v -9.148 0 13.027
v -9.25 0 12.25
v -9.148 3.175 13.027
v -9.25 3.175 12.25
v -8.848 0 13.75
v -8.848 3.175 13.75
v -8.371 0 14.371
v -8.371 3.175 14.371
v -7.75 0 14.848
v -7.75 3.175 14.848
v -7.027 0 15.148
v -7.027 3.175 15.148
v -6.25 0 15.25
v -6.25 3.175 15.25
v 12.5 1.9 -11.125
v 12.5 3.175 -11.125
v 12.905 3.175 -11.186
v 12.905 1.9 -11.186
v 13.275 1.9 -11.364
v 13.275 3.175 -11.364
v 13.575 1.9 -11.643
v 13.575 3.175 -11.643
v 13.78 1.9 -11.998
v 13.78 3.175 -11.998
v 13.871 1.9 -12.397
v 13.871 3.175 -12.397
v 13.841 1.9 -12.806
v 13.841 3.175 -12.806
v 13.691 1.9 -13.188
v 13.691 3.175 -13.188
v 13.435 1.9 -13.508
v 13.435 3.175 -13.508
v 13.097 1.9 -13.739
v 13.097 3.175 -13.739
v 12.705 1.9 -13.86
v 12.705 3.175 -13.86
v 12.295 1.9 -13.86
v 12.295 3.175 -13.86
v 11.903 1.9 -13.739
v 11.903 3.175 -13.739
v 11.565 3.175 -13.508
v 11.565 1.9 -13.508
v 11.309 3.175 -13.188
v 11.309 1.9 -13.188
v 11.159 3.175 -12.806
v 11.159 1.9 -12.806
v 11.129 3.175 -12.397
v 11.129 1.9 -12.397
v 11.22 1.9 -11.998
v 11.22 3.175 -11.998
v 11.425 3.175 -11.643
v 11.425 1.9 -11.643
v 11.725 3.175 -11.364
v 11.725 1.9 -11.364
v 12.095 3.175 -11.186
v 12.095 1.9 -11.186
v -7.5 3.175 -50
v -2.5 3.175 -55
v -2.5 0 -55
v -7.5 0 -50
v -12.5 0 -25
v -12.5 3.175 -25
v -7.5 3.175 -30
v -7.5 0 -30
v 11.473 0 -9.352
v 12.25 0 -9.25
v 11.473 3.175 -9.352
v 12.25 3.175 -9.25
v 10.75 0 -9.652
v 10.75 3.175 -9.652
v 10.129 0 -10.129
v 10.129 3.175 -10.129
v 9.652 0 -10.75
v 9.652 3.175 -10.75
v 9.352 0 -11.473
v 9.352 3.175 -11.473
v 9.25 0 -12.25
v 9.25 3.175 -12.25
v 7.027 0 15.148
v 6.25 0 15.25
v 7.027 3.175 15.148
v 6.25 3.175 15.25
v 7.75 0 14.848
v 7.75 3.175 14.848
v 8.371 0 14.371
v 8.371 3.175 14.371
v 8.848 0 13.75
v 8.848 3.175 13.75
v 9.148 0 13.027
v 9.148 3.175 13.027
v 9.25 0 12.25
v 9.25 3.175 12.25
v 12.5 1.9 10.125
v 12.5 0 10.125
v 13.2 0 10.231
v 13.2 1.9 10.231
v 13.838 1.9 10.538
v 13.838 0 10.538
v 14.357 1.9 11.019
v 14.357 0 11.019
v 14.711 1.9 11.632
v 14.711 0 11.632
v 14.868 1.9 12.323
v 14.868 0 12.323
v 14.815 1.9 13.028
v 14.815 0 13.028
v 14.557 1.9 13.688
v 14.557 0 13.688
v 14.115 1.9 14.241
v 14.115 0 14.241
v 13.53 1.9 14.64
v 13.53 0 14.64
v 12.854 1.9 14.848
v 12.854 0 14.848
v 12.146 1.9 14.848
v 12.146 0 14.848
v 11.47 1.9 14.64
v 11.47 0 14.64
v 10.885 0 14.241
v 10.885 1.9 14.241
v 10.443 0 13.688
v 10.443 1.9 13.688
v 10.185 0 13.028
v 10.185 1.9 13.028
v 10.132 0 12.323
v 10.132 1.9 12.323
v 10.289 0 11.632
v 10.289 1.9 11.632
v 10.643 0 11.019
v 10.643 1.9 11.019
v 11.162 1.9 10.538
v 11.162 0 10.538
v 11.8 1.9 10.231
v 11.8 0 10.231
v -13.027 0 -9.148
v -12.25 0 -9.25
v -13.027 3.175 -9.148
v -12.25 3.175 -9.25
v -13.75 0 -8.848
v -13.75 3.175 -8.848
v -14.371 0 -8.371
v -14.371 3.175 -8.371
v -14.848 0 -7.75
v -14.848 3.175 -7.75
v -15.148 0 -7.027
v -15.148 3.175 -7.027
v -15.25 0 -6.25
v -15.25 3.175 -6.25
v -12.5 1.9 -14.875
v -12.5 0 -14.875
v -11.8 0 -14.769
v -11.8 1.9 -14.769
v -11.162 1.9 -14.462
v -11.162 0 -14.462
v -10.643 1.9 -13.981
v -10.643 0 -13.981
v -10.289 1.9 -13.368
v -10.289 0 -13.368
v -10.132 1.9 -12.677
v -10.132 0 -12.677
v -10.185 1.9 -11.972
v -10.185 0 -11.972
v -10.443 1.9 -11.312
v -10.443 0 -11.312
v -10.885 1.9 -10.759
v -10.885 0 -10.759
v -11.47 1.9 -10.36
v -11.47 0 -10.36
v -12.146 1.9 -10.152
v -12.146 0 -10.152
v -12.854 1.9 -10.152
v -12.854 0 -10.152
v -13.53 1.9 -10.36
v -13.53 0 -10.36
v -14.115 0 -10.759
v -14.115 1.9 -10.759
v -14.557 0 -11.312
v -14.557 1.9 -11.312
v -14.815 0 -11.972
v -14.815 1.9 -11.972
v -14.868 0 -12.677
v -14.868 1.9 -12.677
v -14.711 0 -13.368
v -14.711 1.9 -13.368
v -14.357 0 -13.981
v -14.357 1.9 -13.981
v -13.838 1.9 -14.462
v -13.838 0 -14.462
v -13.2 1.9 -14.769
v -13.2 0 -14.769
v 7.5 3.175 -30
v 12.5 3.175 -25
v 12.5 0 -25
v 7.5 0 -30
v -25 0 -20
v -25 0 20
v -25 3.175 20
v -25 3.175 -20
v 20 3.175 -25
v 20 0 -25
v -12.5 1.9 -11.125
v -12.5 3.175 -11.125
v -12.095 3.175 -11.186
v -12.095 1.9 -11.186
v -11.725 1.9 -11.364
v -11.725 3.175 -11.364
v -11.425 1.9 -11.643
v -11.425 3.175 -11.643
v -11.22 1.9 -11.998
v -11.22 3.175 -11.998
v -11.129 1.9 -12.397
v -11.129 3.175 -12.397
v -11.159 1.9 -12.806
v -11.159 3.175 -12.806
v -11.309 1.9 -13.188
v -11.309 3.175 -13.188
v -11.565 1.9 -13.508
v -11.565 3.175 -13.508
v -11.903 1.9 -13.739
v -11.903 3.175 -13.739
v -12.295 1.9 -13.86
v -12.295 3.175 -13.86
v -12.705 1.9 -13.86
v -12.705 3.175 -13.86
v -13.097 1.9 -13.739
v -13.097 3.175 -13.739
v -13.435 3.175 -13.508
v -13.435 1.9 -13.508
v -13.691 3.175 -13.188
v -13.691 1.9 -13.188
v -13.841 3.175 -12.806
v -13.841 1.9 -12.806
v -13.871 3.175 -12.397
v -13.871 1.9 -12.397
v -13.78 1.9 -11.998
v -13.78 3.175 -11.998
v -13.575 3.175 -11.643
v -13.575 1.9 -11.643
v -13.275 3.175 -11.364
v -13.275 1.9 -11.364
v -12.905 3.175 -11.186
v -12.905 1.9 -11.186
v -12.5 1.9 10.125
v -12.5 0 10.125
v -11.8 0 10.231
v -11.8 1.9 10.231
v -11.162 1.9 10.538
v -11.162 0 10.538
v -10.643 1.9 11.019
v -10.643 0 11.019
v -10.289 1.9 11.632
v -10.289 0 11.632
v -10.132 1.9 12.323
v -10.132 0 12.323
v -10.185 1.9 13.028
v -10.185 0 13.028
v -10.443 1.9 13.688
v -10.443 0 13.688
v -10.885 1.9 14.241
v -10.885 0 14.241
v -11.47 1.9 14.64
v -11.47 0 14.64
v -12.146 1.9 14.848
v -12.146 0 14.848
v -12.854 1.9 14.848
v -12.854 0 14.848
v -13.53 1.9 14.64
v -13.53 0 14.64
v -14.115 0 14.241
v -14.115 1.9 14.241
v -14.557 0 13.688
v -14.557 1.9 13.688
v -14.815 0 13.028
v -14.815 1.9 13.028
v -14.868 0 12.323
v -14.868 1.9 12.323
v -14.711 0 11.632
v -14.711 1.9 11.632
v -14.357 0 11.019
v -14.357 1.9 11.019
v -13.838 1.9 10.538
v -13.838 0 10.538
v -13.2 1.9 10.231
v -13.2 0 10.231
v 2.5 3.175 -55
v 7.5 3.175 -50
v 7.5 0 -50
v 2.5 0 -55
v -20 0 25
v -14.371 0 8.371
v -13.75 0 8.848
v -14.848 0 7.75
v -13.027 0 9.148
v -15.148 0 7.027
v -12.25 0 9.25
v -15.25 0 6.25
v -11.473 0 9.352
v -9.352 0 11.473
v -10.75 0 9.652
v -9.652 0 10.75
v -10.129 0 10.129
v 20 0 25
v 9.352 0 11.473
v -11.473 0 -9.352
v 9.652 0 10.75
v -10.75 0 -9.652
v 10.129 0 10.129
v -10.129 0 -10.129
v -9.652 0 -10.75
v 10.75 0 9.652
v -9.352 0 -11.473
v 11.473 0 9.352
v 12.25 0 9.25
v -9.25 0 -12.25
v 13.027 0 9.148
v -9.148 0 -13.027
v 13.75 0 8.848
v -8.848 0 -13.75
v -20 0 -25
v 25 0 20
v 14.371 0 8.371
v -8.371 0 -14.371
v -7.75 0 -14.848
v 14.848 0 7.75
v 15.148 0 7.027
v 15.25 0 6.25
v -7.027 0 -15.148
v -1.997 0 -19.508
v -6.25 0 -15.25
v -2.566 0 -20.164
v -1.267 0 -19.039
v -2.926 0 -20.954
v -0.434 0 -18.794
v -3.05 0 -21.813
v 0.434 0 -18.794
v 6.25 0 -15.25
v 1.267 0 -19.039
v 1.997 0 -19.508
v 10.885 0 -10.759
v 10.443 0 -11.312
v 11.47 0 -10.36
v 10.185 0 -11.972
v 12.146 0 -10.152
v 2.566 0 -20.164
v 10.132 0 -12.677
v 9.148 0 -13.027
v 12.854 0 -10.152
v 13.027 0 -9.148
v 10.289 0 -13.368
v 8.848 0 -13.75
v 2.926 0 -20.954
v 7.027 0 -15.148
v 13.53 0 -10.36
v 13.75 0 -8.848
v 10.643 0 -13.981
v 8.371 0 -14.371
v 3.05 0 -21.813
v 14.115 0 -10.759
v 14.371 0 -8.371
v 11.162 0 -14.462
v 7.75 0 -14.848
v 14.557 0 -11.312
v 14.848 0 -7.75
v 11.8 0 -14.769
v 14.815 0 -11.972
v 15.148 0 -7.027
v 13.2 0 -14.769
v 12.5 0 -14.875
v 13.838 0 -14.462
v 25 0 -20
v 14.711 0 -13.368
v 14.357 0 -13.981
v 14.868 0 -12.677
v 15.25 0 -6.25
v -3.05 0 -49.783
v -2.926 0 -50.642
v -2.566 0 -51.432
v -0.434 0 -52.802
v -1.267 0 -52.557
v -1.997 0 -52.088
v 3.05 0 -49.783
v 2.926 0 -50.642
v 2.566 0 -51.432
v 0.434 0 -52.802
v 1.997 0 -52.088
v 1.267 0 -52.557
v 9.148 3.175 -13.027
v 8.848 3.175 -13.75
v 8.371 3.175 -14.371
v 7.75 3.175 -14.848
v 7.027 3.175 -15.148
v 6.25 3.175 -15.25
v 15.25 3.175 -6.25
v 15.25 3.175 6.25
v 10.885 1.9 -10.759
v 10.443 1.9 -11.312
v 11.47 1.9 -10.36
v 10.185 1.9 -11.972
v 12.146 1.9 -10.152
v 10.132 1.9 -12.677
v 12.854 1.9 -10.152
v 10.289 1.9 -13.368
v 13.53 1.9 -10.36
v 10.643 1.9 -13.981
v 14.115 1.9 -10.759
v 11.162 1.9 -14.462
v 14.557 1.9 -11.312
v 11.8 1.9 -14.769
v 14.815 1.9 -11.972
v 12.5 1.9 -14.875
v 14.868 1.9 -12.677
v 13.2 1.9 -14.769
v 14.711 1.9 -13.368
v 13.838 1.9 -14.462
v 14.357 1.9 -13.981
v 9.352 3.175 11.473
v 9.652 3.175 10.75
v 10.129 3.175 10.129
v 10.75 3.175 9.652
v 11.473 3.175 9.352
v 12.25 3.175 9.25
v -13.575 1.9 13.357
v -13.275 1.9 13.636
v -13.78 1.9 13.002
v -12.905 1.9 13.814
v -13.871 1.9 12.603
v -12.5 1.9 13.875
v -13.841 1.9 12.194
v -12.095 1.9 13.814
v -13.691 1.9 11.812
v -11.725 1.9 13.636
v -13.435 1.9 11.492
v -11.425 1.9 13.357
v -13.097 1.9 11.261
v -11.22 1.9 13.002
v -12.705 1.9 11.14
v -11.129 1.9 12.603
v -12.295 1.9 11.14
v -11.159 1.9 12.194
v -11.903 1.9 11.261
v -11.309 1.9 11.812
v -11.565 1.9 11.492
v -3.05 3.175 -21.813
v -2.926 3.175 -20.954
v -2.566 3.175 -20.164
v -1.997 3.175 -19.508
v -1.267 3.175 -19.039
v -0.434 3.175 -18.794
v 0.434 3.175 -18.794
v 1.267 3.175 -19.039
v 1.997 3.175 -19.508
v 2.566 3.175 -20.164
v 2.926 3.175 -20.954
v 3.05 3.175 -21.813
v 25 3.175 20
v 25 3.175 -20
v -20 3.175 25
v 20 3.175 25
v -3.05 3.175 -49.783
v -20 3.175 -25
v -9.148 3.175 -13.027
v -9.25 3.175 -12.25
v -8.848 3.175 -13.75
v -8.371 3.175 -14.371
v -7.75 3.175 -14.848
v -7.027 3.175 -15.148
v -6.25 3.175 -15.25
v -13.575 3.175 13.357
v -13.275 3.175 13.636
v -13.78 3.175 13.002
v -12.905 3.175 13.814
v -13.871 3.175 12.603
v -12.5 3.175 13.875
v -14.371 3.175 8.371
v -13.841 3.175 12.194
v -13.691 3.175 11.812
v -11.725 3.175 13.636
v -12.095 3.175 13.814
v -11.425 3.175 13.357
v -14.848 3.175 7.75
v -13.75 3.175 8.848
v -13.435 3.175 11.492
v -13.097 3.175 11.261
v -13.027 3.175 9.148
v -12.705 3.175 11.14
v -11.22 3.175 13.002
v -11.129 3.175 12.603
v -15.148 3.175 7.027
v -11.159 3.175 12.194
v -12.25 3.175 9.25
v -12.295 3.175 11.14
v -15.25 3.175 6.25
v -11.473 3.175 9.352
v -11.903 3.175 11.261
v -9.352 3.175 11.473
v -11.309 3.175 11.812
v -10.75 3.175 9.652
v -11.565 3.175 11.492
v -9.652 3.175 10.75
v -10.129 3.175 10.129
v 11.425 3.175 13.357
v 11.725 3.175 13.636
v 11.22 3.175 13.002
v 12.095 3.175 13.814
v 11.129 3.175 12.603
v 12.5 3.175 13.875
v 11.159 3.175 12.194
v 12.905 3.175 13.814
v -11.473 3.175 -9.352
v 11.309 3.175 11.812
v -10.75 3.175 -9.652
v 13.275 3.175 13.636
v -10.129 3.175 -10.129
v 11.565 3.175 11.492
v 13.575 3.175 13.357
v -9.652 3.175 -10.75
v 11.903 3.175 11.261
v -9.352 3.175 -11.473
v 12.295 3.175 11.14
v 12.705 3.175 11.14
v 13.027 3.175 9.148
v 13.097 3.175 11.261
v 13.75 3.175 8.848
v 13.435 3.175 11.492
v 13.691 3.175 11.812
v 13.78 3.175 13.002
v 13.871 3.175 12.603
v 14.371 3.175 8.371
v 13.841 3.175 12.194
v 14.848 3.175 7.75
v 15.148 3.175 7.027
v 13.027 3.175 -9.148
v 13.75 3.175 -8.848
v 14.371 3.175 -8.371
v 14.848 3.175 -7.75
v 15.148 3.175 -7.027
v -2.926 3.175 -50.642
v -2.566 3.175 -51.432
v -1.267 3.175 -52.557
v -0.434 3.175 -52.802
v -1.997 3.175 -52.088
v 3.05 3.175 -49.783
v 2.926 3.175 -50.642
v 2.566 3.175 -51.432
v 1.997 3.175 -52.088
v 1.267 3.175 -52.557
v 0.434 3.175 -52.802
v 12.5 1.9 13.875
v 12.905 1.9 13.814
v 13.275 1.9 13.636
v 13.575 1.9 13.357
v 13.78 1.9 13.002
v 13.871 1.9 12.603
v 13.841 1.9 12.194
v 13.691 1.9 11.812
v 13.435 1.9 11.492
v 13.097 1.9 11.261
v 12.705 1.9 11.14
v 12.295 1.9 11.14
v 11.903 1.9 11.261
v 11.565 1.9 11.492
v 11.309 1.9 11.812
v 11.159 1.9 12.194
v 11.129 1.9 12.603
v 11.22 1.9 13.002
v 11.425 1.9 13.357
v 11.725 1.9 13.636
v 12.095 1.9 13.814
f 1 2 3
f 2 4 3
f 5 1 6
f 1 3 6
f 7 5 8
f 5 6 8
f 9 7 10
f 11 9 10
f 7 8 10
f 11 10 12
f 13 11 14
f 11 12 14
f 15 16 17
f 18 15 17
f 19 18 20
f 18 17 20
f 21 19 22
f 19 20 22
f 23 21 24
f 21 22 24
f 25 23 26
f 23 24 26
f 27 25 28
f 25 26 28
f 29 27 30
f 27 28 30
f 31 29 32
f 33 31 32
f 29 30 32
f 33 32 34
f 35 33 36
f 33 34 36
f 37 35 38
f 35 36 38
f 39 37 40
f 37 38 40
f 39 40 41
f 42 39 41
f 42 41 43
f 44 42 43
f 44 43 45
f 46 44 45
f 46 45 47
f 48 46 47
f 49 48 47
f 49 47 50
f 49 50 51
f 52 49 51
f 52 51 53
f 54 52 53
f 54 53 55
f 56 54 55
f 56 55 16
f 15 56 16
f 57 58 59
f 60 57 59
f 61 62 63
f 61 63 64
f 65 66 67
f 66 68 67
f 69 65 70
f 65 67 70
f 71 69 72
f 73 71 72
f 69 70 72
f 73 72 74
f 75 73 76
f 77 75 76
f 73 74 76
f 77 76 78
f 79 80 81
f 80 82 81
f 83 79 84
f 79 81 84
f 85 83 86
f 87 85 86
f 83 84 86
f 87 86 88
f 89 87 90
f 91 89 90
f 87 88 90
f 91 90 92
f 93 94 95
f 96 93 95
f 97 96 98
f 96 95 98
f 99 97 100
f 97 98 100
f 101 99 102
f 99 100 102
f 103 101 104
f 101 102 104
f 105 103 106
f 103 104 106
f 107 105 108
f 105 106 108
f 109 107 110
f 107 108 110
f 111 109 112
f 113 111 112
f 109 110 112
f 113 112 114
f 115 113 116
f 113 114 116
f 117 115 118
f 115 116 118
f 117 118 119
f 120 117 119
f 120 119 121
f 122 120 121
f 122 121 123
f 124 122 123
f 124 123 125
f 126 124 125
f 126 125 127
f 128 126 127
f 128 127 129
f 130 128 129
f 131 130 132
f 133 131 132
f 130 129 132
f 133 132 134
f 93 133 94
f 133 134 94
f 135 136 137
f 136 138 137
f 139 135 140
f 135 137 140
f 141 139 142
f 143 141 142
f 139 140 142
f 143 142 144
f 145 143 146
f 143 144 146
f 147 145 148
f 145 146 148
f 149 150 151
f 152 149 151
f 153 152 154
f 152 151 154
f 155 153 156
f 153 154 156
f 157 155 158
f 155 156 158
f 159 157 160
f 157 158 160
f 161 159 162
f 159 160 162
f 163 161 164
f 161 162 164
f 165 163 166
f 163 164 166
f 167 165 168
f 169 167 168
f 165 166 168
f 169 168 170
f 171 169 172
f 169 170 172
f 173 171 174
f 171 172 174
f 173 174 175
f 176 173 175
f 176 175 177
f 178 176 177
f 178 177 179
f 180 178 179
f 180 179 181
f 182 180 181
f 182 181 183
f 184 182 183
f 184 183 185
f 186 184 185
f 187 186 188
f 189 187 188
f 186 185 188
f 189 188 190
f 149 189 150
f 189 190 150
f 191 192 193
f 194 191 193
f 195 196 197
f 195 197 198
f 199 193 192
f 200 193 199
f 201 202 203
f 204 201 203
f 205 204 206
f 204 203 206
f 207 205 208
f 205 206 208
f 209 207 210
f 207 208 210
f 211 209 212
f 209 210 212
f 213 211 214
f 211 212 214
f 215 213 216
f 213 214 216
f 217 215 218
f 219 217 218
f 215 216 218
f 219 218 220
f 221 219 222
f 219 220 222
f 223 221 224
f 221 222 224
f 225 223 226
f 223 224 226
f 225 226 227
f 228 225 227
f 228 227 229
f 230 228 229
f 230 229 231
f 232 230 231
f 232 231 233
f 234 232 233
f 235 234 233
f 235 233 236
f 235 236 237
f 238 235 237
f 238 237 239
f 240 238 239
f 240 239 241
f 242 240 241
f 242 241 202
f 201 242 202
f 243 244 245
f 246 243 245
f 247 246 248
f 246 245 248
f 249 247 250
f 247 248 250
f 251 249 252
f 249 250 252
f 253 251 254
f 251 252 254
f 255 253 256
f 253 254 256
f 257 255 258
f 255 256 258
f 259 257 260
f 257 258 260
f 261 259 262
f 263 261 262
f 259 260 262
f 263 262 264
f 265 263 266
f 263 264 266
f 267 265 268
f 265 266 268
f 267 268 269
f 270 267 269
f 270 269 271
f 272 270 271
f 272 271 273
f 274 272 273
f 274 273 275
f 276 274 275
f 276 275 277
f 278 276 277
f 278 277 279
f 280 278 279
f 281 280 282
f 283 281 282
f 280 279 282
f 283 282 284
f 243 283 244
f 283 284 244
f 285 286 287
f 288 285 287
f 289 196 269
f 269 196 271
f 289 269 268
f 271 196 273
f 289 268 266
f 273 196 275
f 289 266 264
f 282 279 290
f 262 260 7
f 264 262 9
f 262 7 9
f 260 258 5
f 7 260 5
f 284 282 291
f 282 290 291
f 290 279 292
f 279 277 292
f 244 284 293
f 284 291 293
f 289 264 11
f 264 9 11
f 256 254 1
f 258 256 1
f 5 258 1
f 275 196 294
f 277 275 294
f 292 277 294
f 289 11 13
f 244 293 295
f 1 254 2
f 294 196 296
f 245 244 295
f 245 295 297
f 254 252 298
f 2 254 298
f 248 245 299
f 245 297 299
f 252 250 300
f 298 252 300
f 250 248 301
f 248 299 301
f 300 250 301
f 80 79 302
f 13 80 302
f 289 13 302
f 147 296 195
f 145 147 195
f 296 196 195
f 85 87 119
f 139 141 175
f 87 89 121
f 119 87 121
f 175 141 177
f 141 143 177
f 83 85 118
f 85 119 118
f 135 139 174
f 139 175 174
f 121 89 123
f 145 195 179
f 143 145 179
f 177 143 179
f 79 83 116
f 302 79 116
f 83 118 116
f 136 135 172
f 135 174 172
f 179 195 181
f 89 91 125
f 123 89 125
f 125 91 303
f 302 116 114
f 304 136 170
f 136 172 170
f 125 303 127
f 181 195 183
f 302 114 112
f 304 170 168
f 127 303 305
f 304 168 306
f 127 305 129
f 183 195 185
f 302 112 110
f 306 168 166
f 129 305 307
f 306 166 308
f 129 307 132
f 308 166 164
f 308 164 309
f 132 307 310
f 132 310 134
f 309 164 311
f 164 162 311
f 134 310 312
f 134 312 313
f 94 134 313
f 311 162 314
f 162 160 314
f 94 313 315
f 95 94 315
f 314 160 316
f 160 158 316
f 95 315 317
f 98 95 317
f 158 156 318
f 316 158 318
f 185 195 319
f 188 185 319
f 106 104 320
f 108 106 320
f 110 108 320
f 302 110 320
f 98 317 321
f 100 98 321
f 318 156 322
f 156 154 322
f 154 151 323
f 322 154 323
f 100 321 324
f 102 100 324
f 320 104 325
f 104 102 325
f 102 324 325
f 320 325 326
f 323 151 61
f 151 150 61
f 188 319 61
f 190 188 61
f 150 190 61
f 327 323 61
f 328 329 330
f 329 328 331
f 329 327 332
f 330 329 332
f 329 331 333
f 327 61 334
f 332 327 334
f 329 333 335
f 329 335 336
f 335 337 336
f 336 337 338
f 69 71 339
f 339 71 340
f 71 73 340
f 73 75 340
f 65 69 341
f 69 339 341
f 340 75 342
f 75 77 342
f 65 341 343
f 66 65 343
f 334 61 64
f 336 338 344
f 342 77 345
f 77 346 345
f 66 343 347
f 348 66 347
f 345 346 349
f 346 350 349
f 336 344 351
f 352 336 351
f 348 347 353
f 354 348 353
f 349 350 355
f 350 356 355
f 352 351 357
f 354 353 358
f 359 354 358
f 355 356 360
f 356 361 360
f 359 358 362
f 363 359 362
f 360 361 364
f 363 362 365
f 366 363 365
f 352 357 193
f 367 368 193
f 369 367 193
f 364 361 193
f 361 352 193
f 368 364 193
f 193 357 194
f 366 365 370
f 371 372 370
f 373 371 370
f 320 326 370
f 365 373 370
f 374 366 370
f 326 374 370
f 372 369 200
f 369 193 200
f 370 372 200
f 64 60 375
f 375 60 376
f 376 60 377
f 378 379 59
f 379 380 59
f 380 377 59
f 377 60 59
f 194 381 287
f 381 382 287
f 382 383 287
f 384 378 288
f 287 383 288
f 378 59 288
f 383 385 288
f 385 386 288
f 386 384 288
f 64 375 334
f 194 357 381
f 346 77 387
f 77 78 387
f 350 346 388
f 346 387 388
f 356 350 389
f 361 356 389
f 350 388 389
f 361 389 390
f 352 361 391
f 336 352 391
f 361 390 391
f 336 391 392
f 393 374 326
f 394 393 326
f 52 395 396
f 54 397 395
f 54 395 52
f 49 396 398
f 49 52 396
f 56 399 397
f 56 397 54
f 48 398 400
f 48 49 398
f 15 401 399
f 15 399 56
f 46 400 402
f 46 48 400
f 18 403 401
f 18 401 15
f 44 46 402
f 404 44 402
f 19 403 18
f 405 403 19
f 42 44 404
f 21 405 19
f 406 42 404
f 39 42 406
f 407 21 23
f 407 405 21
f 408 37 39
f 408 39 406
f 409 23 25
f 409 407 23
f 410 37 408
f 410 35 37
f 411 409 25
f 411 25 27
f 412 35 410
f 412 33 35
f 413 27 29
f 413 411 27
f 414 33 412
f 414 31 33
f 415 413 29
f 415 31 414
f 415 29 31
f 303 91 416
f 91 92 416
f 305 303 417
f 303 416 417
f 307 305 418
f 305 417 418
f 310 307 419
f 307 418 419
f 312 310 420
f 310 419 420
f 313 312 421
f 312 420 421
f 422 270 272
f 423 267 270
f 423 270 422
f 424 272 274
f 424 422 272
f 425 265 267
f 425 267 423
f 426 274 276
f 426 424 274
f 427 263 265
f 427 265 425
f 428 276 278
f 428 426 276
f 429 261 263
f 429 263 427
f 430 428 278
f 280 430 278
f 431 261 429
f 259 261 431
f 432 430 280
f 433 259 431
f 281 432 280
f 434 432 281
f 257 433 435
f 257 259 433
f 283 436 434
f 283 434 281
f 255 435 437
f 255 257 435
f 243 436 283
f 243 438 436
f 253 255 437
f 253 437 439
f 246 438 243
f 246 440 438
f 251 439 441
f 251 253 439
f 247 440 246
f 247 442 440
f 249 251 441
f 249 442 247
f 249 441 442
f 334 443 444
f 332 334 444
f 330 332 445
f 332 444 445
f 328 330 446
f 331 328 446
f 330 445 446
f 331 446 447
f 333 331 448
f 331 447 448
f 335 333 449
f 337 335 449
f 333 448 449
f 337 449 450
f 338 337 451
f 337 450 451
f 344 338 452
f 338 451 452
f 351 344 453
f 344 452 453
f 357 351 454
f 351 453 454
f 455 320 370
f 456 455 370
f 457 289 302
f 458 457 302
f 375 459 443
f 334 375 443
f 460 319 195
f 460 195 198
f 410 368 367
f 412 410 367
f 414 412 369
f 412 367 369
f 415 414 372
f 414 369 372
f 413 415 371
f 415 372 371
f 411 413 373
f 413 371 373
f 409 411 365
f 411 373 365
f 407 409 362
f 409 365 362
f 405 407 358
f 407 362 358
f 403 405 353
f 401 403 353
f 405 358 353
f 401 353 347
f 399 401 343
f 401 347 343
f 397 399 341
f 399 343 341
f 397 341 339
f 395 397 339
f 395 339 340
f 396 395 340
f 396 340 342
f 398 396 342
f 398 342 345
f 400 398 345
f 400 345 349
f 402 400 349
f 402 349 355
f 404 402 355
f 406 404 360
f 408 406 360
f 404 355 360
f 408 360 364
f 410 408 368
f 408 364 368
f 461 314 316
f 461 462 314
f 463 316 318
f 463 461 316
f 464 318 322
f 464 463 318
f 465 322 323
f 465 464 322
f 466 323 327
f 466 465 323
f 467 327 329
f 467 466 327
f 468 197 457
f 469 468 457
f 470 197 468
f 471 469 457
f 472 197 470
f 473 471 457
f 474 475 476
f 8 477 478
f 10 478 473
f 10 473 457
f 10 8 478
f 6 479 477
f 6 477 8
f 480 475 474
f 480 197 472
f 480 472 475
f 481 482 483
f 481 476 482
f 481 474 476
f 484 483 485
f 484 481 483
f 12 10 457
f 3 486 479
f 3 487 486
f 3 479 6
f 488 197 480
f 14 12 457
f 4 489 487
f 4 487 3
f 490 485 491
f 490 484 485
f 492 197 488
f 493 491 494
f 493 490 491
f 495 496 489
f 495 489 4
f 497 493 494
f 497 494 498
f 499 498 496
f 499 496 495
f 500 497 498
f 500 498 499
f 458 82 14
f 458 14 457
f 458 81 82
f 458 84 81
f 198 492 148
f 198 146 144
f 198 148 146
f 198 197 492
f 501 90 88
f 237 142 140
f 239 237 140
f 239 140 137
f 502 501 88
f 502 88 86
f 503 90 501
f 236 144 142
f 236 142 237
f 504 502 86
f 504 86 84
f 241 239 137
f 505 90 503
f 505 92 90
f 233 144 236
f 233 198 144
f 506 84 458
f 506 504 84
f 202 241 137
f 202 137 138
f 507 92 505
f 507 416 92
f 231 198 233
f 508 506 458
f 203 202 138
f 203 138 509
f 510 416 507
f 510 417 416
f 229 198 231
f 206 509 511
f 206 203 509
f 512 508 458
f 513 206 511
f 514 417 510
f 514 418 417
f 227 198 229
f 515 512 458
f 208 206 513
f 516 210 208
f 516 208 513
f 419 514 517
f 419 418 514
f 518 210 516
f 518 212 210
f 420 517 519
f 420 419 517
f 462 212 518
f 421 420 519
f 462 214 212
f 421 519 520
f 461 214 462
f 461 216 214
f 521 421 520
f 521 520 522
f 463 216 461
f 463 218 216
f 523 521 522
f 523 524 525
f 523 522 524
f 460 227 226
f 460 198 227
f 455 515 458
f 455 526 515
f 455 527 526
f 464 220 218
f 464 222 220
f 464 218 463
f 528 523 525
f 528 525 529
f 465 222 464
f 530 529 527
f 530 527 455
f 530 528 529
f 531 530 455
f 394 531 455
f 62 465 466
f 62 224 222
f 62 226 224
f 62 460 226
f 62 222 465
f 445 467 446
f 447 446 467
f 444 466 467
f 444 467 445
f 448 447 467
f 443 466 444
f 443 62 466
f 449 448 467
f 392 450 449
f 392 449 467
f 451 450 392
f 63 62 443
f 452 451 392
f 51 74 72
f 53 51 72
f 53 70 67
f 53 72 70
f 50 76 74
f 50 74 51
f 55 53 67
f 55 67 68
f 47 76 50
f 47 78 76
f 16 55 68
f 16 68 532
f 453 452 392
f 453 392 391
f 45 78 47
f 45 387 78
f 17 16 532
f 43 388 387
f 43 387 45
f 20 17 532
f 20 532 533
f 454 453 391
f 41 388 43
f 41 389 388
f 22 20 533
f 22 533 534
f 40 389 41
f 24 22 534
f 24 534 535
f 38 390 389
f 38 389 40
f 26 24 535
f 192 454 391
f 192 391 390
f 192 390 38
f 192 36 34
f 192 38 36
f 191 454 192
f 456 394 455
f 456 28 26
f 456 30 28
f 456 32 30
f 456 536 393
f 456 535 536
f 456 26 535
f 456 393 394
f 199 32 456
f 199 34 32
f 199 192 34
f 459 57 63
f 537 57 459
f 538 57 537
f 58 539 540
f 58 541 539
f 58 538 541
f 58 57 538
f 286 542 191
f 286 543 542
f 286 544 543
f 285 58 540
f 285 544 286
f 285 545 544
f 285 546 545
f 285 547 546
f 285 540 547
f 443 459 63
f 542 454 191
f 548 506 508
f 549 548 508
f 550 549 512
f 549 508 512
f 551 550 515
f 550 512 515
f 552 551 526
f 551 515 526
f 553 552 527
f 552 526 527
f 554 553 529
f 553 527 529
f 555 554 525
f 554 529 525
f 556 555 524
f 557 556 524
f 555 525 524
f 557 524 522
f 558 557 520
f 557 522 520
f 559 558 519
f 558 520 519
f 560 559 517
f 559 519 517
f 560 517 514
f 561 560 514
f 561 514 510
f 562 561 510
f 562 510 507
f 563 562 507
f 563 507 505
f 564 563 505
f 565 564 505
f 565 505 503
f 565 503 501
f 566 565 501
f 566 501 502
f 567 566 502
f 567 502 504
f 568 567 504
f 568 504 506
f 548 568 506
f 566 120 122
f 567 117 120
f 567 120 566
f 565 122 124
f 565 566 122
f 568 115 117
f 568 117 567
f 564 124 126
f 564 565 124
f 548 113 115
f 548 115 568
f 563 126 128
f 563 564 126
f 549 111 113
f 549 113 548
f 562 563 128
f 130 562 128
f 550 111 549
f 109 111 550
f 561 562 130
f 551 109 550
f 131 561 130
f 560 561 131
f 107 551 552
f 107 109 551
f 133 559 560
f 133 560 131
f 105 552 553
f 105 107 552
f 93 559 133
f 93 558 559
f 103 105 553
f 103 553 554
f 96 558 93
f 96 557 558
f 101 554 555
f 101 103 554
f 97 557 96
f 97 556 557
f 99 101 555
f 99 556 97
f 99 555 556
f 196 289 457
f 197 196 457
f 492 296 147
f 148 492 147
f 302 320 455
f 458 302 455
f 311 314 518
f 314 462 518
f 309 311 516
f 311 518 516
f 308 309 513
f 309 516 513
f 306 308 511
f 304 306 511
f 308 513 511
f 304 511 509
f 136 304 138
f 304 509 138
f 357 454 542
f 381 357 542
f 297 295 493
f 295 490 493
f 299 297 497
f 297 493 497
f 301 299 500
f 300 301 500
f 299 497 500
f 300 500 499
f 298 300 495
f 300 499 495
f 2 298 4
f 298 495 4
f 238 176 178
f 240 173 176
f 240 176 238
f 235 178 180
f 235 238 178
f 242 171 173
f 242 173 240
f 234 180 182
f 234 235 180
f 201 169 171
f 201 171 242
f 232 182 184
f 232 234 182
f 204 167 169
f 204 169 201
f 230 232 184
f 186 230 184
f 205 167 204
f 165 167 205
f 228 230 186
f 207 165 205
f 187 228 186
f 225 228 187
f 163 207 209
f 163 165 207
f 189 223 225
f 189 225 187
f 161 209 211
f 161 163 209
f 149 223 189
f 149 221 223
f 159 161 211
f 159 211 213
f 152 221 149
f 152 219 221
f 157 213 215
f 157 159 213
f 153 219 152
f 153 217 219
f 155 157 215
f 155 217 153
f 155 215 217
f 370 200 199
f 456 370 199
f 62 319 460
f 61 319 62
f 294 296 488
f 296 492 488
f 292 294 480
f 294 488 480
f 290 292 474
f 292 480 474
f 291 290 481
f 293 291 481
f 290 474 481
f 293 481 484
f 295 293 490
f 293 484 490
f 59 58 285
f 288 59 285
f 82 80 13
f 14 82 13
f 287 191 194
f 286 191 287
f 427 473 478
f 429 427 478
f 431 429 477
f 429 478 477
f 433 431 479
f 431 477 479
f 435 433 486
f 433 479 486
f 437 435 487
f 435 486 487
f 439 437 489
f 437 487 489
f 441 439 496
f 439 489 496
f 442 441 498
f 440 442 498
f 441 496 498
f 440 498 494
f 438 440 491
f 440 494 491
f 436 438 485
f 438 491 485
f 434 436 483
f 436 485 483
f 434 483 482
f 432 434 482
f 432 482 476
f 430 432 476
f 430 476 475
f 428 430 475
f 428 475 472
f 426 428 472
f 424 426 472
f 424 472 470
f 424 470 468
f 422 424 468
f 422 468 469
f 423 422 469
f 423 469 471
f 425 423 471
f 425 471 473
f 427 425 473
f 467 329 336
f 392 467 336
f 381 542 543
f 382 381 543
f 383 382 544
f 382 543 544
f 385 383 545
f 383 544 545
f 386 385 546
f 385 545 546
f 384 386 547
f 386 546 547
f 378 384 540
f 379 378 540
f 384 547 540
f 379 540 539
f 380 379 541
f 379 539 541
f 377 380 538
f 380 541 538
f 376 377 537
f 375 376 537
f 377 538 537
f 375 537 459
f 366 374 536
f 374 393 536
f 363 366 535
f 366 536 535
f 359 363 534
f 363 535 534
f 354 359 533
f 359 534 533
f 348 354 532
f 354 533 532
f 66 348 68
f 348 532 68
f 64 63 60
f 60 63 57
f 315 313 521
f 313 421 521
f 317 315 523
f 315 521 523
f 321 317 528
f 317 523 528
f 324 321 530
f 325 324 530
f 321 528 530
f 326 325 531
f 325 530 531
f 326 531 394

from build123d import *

# Parameters (mm, degrees)
SKETCH2_W           = 50
SKETCH2_H           = 50
BOSS_EXTRUDE1_DEPTH = 3.175
SKETCH3_R           = 1.375
CUT_EXTRUDE1_DEPTH  = 36.497614356
SKETCH5_R           = 2.375
CUT_EXTRUDE3_DEPTH  = 1.9
CUT_EXTRUDE9_DEPTH  = 36.497614356
FILLET1_R           = 3
SKETCH11_W          = 15
SKETCH11_H          = 30
BOSS_EXTRUDE2_DEPTH = 3.175
CUT_EXTRUDE10_REACH = 62.499
CHAMFER1_SIZE       = 5


with BuildPart() as part:
    # Sketch2 → Boss-Extrude1 (new body)
    with BuildSketch(Plane(origin=(0, 0, 0), x_dir=(1, 0, 0), z_dir=(0, 1, 0))):
        Rectangle(SKETCH2_W, SKETCH2_H)
    extrude(amount=BOSS_EXTRUDE1_DEPTH)

    # Sketch3 → Cut-Extrude1 (cut, through all)
    with BuildSketch(Plane(origin=(0, 3.175, 0), x_dir=(1, 0, 0), z_dir=(0, 1, 0))):
        with Locations(Location((12.5, 12.5, 0), (0, 0, 270))):
            Circle(SKETCH3_R)
        with Locations(Location((-12.5, 12.5, 0), (0, 0, 270))):
            Circle(SKETCH3_R)
        with Locations(Location((-12.5, -12.5, 0), (0, 0, 270))):
            Circle(SKETCH3_R)
        with Locations(Location((12.5, -12.5, 0), (0, 0, 270))):
            Circle(SKETCH3_R)
    extrude(amount=-CUT_EXTRUDE1_DEPTH, mode=Mode.SUBTRACT)

    # Sketch5 → Cut-Extrude3 (cut)
    with BuildSketch(Plane.XZ):
        with Locations(Location((12.5, 12.5, 0), (0, 0, 270))):
            Circle(SKETCH5_R)
        with Locations(Location((-12.5, 12.5, 0), (0, 0, 270))):
            Circle(SKETCH5_R)
        with Locations(Location((12.5, -12.5, 0), (0, 0, 270))):
            Circle(SKETCH5_R)
        with Locations(Location((-12.5, -12.5, 0), (0, 0, 270))):
            Circle(SKETCH5_R)
    extrude(amount=-CUT_EXTRUDE3_DEPTH, mode=Mode.SUBTRACT)

    # Sketch10 → Cut-Extrude9 (cut, through all)
    with BuildSketch(Plane.XZ):
        Polygon((-9.25, -15.25), (9.25, -15.25), (9.25, -9.25), (15.25, -9.25), (15.25, 9.25), (9.25, 9.25), (9.25, 15.25), (-9.25, 15.25), (-9.25, 9.25), (-15.25, 9.25), (-15.25, -9.25), (-9.25, -9.25), align=None)
    extrude(amount=-CUT_EXTRUDE9_DEPTH, mode=Mode.SUBTRACT)

    # Fillet1
    fillet1_edges = [part.edges().sort_by_distance(p)[0] for p in [
        (15.25, 1.5875, -9.25),
        (15.25, 1.5875, 9.25),
        (-9.25, 1.5875, -15.25),
        (9.25, 1.5875, -15.25),
        (9.25, 1.5875, 15.25),
        (-9.25, 1.5875, 15.25),
        (-15.25, 1.5875, 9.25),
        (-15.25, 1.5875, -9.25),
        (9.25, 1.5875, 9.25),
        (-9.25, 1.5875, 9.25),
        (9.25, 1.5875, -9.25),
        (-9.25, 1.5875, -9.25),
    ]]
    fillet(fillet1_edges, radius=FILLET1_R - 0.0001)  # a hair under: the kernel refuses the full size

    # Sketch11 → Boss-Extrude2 (add)
    with BuildSketch(Plane(origin=(0, 3.175, 0), x_dir=(1, 0, 0), z_dir=(0, 1, 0))):
        with Locations((0, 40)):
            Rectangle(SKETCH11_W, SKETCH11_H)
    extrude(amount=-BOSS_EXTRUDE2_DEPTH)

    # Sketch13 → Cut-Extrude10 (cut, up to next)
    with BuildSketch(Plane(origin=(0, 3.175, 0), x_dir=(1, 0, 0), z_dir=(0, 1, 0)), mode=Mode.PRIVATE) as cut_extrude10_sk1:
        with BuildLine():
            Line((-3.05, 49.782863058), (-3.05, 21.813452658))
            ThreePointArc((-3.05, 21.813452658), (0, 18.763452658), (3.05, 21.813452658))
            Line((3.05, 21.813452658), (3.05, 49.782863058))
            ThreePointArc((3.05, 49.782863058), (0, 52.832863058), (-3.05, 49.782863058))
        make_face()
    cut_extrude10_tool1 = extrude(cut_extrude10_sk1.sketch, amount=-CUT_EXTRUDE10_REACH, mode=Mode.PRIVATE) & part.part
    add(cut_extrude10_tool1.solids().sort_by_distance((0, 3.175, -35.798158))[0], mode=Mode.SUBTRACT)

    # Chamfer1
    chamfer1_edges = [part.edges().sort_by_distance(p)[0] for p in [
        (7.5, 1.5875, -25),
        (7.5, 1.5875, -55),
        (-7.5, 1.5875, -55),
        (-7.5, 1.5875, -25),
        (25, 1.5875, 25),
        (-25, 1.5875, 25),
        (-25, 1.5875, -25),
        (25, 1.5875, -25),
    ]]
    chamfer(chamfer1_edges, length=CHAMFER1_SIZE)


solid = part.part
